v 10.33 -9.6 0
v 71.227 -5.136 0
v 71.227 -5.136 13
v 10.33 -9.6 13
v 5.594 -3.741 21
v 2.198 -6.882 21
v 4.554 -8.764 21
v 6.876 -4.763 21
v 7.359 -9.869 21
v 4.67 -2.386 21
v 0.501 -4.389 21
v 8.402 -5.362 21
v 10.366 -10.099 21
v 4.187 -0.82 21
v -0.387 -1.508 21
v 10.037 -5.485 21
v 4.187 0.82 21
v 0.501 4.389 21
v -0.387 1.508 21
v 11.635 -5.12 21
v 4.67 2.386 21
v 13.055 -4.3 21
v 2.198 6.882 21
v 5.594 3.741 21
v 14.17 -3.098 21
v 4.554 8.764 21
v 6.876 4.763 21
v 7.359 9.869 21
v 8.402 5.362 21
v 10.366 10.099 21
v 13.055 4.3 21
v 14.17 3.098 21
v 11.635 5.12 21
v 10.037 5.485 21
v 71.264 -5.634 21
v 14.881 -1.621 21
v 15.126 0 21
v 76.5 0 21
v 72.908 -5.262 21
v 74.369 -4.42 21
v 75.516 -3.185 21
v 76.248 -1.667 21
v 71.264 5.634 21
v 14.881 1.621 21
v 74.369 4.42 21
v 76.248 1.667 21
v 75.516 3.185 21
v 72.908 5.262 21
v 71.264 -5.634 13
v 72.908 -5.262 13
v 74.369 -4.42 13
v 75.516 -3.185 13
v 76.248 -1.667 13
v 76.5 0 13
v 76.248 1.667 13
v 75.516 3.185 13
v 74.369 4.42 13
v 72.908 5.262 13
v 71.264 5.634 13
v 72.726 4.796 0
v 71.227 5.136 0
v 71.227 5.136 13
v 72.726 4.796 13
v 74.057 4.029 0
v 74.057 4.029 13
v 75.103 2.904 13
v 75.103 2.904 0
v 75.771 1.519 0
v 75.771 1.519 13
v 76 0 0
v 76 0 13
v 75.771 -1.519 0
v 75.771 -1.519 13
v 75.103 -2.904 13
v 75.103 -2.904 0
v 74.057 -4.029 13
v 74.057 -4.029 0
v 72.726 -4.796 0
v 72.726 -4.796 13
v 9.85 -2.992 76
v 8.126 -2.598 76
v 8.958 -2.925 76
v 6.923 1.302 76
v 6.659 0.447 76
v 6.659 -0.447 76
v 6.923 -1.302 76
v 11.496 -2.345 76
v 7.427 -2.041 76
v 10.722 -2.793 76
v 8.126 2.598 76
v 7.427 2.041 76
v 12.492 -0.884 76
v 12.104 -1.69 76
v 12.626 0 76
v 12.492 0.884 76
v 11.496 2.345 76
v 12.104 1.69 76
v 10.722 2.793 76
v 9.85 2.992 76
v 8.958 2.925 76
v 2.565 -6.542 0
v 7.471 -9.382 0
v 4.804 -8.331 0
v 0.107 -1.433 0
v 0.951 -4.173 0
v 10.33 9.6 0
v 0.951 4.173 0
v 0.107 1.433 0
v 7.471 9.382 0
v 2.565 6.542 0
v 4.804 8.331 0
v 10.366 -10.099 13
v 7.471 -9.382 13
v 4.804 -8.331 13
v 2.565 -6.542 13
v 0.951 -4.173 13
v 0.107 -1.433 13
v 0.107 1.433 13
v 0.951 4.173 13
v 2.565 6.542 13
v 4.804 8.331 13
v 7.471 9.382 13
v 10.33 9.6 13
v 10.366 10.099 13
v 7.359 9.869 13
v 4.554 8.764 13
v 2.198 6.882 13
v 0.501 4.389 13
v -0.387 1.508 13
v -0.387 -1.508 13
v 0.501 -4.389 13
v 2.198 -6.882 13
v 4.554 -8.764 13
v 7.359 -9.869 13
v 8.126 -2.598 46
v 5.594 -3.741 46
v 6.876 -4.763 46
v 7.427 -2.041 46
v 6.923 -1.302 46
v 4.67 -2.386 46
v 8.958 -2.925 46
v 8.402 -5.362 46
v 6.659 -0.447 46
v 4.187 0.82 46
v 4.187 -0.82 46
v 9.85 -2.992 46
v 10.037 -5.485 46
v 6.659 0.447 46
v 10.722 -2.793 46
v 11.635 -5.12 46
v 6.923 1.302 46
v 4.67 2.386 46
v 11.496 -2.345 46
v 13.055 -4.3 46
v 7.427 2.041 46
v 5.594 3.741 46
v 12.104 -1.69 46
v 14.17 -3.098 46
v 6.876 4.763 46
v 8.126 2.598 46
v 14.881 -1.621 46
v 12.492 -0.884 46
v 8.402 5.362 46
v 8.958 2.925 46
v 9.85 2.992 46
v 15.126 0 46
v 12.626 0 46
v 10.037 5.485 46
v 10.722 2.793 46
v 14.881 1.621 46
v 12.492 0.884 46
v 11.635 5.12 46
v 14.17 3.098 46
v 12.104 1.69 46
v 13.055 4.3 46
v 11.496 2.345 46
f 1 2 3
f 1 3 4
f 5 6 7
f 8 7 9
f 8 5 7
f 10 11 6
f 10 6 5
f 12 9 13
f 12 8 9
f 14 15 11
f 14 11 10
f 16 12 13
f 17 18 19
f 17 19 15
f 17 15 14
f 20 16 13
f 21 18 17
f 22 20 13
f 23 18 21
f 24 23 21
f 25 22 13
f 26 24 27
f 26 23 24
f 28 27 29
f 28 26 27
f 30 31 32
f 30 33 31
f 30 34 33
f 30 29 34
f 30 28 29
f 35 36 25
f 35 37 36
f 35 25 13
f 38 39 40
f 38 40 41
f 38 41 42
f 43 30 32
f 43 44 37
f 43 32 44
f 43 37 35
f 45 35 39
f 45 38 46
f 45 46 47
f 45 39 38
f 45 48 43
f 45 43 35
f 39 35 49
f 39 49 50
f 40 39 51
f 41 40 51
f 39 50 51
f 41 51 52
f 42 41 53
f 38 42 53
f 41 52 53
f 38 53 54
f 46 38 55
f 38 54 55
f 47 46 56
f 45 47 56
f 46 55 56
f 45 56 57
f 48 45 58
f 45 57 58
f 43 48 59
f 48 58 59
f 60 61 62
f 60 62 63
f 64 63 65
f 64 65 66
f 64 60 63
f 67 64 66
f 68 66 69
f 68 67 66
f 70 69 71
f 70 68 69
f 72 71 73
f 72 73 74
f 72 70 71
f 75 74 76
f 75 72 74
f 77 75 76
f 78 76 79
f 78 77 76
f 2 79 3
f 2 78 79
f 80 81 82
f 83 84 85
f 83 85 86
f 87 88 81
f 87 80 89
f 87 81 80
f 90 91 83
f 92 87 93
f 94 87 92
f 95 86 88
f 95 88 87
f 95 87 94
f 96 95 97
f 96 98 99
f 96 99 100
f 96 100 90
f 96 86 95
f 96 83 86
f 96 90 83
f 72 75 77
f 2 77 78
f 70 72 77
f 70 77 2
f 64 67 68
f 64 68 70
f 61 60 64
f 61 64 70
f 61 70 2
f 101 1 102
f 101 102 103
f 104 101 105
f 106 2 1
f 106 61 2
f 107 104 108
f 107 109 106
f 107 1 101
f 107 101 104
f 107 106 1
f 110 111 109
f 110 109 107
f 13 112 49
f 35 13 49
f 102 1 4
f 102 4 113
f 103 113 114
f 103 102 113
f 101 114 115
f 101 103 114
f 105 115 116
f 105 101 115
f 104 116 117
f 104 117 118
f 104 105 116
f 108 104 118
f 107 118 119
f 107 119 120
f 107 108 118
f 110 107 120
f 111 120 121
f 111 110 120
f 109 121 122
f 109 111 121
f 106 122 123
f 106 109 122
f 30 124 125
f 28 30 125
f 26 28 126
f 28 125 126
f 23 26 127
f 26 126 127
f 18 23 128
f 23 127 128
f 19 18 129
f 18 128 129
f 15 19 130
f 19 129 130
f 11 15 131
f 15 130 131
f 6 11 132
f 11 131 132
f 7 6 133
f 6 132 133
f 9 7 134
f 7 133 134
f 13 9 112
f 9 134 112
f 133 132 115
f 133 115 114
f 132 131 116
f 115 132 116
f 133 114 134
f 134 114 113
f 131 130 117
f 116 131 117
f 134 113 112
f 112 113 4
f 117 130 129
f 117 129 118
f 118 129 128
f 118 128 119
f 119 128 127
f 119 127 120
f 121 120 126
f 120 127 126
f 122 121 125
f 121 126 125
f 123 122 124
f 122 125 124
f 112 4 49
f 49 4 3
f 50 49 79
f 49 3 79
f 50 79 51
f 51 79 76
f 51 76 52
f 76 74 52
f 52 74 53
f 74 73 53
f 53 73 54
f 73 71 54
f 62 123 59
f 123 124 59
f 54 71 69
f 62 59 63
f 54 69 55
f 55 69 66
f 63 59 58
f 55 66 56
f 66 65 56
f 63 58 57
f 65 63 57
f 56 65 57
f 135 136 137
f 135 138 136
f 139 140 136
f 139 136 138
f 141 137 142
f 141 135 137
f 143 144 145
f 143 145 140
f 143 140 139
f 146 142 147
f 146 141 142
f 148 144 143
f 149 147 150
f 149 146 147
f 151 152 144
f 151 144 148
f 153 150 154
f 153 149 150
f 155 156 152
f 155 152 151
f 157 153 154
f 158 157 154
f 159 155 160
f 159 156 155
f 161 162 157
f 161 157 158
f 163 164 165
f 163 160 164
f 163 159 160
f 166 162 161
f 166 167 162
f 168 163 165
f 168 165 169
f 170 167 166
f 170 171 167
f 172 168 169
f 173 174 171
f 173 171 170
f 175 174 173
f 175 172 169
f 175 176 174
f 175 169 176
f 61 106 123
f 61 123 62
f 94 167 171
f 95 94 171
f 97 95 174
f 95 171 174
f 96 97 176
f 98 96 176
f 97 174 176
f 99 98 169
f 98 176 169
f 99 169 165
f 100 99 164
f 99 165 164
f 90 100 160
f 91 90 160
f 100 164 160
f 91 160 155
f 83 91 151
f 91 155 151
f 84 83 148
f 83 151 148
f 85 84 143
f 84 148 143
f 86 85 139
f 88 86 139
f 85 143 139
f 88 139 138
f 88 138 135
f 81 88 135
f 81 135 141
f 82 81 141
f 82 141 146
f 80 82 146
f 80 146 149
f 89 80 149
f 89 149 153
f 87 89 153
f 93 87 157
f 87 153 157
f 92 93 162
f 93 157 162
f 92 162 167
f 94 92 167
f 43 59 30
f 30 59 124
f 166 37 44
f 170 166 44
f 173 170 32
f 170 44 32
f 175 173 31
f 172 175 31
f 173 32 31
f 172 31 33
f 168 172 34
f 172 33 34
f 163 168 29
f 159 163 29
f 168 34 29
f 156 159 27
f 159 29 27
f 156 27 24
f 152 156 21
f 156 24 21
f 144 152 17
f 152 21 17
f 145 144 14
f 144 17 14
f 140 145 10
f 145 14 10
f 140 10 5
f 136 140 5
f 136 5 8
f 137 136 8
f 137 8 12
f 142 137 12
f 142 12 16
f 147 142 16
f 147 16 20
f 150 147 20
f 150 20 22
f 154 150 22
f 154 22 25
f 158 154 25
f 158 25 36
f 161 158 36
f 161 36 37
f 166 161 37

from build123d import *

# Parameters (mm, degrees)
BOSS_EXTRU_1_DEPTH      = 13
BOSS_EXTRU_2_DEPTH      = 8
ESQUISSE4_R             = 5.5
BOSS_EXTRU_3_DEPTH      = 55
ENL_V_START             = -30
ESQUISSE5_R             = 5.5
ESQUISSE5_R_2           = 3
ENL_V_MAT_EXTRU_1_DEPTH = 30


with BuildPart() as part:
    # Esquisse1 → Boss.-Extru.1 (new body)
    with BuildSketch(Plane.XY):
        with BuildLine():
            Line((10.329521935, 9.6), (71.2270063, 5.135702408))
            ThreePointArc((71.2270063, 5.135702408), (76, 0), (71.2270063, -5.135702408))
            Line((71.2270063, -5.135702408), (10.329521935, -9.6))
            ThreePointArc((10.329521935, -9.6), (0, 0), (10.329521935, 9.6))
        make_face()
    extrude(amount=BOSS_EXTRU_1_DEPTH)

    # Esquisse3 → Boss.-Extru.2 (add)
    with BuildSketch(Plane.XY.offset(13)):
        with BuildLine():
            Line((71.263562407, 5.634364269), (10.366078041, 10.09866186))
            ThreePointArc((10.366078041, 10.09866186), (-0.5, 0), (10.366078041, -10.09866186))
            Line((10.366078041, -10.09866186), (71.263562407, -5.634364269))
            ThreePointArc((71.263562407, -5.634364269), (76.5, 0), (71.263562407, 5.634364269))
        make_face()
    extrude(amount=BOSS_EXTRU_2_DEPTH)

    # Esquisse4 → Boss.-Extru.3 (add)
    with BuildSketch(Plane.XY.offset(21)):
        with Locations((9.625761224, 0)):
            Circle(ESQUISSE4_R)
    extrude(amount=BOSS_EXTRU_3_DEPTH)

    # Esquisse5 → Enlèv. mat.-Extru.1 (cut)
    with BuildSketch(Plane.XY.offset(76).offset(ENL_V_START)):
        with Locations((9.625761224, 0)):
            Circle(ESQUISSE5_R)
        with Locations((9.625761224, 0)):
            Circle(ESQUISSE5_R_2, mode=Mode.SUBTRACT)
    extrude(amount=ENL_V_MAT_EXTRU_1_DEPTH, mode=Mode.SUBTRACT)


solid = part.part
